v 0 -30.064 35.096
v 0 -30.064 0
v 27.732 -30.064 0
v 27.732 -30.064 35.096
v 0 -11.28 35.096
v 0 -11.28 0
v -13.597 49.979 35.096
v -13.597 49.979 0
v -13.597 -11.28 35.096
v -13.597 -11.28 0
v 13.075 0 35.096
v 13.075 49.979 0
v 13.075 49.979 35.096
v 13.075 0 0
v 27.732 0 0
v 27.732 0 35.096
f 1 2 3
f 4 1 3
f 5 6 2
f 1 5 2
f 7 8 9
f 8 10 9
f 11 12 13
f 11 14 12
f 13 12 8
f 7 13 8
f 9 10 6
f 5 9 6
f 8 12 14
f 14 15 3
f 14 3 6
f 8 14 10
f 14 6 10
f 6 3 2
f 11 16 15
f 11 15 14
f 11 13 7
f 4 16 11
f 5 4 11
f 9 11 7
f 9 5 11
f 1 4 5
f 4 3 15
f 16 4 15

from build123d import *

# Parameters (mm, degrees)
F0_W     = 13.075247407
F0_H     = 11.2796872854
F1_DEPTH = 35.0964441895
F2_DEPTH = 14.6482251585


with BuildPart() as f1:
    # F0 (on Top) → F1 (new body)
    with BuildSketch(Plane.XY):
        Polygon((0, -11.2796872854), (0, 0), (13.075247407, 0), (13.075247407, 35.3304594755), (-13.5974138975, 35.3304594755), (-13.5974138975, -11.2796872854), align=None)
        Polygon((27.7324952185, 0), (13.075247407, 0), (13.075247407, -11.2796872854), (0, -11.2796872854), (0, -30.0637185574), (27.7324952185, -30.0637185574), align=None)
        with Locations((6.5376237035, -5.6398436427)):
            Rectangle(F0_W, F0_H)
    extrude(amount=F1_DEPTH)

    # F2 (add): a face of the model
    f2_faces = [f1.faces().sort_by_distance(p)[0] for p in [
        (-0.2610832453, 35.3304594755, 17.5482220948),
    ]]
    extrude(f2_faces, amount=F2_DEPTH)


solid = f1.part
